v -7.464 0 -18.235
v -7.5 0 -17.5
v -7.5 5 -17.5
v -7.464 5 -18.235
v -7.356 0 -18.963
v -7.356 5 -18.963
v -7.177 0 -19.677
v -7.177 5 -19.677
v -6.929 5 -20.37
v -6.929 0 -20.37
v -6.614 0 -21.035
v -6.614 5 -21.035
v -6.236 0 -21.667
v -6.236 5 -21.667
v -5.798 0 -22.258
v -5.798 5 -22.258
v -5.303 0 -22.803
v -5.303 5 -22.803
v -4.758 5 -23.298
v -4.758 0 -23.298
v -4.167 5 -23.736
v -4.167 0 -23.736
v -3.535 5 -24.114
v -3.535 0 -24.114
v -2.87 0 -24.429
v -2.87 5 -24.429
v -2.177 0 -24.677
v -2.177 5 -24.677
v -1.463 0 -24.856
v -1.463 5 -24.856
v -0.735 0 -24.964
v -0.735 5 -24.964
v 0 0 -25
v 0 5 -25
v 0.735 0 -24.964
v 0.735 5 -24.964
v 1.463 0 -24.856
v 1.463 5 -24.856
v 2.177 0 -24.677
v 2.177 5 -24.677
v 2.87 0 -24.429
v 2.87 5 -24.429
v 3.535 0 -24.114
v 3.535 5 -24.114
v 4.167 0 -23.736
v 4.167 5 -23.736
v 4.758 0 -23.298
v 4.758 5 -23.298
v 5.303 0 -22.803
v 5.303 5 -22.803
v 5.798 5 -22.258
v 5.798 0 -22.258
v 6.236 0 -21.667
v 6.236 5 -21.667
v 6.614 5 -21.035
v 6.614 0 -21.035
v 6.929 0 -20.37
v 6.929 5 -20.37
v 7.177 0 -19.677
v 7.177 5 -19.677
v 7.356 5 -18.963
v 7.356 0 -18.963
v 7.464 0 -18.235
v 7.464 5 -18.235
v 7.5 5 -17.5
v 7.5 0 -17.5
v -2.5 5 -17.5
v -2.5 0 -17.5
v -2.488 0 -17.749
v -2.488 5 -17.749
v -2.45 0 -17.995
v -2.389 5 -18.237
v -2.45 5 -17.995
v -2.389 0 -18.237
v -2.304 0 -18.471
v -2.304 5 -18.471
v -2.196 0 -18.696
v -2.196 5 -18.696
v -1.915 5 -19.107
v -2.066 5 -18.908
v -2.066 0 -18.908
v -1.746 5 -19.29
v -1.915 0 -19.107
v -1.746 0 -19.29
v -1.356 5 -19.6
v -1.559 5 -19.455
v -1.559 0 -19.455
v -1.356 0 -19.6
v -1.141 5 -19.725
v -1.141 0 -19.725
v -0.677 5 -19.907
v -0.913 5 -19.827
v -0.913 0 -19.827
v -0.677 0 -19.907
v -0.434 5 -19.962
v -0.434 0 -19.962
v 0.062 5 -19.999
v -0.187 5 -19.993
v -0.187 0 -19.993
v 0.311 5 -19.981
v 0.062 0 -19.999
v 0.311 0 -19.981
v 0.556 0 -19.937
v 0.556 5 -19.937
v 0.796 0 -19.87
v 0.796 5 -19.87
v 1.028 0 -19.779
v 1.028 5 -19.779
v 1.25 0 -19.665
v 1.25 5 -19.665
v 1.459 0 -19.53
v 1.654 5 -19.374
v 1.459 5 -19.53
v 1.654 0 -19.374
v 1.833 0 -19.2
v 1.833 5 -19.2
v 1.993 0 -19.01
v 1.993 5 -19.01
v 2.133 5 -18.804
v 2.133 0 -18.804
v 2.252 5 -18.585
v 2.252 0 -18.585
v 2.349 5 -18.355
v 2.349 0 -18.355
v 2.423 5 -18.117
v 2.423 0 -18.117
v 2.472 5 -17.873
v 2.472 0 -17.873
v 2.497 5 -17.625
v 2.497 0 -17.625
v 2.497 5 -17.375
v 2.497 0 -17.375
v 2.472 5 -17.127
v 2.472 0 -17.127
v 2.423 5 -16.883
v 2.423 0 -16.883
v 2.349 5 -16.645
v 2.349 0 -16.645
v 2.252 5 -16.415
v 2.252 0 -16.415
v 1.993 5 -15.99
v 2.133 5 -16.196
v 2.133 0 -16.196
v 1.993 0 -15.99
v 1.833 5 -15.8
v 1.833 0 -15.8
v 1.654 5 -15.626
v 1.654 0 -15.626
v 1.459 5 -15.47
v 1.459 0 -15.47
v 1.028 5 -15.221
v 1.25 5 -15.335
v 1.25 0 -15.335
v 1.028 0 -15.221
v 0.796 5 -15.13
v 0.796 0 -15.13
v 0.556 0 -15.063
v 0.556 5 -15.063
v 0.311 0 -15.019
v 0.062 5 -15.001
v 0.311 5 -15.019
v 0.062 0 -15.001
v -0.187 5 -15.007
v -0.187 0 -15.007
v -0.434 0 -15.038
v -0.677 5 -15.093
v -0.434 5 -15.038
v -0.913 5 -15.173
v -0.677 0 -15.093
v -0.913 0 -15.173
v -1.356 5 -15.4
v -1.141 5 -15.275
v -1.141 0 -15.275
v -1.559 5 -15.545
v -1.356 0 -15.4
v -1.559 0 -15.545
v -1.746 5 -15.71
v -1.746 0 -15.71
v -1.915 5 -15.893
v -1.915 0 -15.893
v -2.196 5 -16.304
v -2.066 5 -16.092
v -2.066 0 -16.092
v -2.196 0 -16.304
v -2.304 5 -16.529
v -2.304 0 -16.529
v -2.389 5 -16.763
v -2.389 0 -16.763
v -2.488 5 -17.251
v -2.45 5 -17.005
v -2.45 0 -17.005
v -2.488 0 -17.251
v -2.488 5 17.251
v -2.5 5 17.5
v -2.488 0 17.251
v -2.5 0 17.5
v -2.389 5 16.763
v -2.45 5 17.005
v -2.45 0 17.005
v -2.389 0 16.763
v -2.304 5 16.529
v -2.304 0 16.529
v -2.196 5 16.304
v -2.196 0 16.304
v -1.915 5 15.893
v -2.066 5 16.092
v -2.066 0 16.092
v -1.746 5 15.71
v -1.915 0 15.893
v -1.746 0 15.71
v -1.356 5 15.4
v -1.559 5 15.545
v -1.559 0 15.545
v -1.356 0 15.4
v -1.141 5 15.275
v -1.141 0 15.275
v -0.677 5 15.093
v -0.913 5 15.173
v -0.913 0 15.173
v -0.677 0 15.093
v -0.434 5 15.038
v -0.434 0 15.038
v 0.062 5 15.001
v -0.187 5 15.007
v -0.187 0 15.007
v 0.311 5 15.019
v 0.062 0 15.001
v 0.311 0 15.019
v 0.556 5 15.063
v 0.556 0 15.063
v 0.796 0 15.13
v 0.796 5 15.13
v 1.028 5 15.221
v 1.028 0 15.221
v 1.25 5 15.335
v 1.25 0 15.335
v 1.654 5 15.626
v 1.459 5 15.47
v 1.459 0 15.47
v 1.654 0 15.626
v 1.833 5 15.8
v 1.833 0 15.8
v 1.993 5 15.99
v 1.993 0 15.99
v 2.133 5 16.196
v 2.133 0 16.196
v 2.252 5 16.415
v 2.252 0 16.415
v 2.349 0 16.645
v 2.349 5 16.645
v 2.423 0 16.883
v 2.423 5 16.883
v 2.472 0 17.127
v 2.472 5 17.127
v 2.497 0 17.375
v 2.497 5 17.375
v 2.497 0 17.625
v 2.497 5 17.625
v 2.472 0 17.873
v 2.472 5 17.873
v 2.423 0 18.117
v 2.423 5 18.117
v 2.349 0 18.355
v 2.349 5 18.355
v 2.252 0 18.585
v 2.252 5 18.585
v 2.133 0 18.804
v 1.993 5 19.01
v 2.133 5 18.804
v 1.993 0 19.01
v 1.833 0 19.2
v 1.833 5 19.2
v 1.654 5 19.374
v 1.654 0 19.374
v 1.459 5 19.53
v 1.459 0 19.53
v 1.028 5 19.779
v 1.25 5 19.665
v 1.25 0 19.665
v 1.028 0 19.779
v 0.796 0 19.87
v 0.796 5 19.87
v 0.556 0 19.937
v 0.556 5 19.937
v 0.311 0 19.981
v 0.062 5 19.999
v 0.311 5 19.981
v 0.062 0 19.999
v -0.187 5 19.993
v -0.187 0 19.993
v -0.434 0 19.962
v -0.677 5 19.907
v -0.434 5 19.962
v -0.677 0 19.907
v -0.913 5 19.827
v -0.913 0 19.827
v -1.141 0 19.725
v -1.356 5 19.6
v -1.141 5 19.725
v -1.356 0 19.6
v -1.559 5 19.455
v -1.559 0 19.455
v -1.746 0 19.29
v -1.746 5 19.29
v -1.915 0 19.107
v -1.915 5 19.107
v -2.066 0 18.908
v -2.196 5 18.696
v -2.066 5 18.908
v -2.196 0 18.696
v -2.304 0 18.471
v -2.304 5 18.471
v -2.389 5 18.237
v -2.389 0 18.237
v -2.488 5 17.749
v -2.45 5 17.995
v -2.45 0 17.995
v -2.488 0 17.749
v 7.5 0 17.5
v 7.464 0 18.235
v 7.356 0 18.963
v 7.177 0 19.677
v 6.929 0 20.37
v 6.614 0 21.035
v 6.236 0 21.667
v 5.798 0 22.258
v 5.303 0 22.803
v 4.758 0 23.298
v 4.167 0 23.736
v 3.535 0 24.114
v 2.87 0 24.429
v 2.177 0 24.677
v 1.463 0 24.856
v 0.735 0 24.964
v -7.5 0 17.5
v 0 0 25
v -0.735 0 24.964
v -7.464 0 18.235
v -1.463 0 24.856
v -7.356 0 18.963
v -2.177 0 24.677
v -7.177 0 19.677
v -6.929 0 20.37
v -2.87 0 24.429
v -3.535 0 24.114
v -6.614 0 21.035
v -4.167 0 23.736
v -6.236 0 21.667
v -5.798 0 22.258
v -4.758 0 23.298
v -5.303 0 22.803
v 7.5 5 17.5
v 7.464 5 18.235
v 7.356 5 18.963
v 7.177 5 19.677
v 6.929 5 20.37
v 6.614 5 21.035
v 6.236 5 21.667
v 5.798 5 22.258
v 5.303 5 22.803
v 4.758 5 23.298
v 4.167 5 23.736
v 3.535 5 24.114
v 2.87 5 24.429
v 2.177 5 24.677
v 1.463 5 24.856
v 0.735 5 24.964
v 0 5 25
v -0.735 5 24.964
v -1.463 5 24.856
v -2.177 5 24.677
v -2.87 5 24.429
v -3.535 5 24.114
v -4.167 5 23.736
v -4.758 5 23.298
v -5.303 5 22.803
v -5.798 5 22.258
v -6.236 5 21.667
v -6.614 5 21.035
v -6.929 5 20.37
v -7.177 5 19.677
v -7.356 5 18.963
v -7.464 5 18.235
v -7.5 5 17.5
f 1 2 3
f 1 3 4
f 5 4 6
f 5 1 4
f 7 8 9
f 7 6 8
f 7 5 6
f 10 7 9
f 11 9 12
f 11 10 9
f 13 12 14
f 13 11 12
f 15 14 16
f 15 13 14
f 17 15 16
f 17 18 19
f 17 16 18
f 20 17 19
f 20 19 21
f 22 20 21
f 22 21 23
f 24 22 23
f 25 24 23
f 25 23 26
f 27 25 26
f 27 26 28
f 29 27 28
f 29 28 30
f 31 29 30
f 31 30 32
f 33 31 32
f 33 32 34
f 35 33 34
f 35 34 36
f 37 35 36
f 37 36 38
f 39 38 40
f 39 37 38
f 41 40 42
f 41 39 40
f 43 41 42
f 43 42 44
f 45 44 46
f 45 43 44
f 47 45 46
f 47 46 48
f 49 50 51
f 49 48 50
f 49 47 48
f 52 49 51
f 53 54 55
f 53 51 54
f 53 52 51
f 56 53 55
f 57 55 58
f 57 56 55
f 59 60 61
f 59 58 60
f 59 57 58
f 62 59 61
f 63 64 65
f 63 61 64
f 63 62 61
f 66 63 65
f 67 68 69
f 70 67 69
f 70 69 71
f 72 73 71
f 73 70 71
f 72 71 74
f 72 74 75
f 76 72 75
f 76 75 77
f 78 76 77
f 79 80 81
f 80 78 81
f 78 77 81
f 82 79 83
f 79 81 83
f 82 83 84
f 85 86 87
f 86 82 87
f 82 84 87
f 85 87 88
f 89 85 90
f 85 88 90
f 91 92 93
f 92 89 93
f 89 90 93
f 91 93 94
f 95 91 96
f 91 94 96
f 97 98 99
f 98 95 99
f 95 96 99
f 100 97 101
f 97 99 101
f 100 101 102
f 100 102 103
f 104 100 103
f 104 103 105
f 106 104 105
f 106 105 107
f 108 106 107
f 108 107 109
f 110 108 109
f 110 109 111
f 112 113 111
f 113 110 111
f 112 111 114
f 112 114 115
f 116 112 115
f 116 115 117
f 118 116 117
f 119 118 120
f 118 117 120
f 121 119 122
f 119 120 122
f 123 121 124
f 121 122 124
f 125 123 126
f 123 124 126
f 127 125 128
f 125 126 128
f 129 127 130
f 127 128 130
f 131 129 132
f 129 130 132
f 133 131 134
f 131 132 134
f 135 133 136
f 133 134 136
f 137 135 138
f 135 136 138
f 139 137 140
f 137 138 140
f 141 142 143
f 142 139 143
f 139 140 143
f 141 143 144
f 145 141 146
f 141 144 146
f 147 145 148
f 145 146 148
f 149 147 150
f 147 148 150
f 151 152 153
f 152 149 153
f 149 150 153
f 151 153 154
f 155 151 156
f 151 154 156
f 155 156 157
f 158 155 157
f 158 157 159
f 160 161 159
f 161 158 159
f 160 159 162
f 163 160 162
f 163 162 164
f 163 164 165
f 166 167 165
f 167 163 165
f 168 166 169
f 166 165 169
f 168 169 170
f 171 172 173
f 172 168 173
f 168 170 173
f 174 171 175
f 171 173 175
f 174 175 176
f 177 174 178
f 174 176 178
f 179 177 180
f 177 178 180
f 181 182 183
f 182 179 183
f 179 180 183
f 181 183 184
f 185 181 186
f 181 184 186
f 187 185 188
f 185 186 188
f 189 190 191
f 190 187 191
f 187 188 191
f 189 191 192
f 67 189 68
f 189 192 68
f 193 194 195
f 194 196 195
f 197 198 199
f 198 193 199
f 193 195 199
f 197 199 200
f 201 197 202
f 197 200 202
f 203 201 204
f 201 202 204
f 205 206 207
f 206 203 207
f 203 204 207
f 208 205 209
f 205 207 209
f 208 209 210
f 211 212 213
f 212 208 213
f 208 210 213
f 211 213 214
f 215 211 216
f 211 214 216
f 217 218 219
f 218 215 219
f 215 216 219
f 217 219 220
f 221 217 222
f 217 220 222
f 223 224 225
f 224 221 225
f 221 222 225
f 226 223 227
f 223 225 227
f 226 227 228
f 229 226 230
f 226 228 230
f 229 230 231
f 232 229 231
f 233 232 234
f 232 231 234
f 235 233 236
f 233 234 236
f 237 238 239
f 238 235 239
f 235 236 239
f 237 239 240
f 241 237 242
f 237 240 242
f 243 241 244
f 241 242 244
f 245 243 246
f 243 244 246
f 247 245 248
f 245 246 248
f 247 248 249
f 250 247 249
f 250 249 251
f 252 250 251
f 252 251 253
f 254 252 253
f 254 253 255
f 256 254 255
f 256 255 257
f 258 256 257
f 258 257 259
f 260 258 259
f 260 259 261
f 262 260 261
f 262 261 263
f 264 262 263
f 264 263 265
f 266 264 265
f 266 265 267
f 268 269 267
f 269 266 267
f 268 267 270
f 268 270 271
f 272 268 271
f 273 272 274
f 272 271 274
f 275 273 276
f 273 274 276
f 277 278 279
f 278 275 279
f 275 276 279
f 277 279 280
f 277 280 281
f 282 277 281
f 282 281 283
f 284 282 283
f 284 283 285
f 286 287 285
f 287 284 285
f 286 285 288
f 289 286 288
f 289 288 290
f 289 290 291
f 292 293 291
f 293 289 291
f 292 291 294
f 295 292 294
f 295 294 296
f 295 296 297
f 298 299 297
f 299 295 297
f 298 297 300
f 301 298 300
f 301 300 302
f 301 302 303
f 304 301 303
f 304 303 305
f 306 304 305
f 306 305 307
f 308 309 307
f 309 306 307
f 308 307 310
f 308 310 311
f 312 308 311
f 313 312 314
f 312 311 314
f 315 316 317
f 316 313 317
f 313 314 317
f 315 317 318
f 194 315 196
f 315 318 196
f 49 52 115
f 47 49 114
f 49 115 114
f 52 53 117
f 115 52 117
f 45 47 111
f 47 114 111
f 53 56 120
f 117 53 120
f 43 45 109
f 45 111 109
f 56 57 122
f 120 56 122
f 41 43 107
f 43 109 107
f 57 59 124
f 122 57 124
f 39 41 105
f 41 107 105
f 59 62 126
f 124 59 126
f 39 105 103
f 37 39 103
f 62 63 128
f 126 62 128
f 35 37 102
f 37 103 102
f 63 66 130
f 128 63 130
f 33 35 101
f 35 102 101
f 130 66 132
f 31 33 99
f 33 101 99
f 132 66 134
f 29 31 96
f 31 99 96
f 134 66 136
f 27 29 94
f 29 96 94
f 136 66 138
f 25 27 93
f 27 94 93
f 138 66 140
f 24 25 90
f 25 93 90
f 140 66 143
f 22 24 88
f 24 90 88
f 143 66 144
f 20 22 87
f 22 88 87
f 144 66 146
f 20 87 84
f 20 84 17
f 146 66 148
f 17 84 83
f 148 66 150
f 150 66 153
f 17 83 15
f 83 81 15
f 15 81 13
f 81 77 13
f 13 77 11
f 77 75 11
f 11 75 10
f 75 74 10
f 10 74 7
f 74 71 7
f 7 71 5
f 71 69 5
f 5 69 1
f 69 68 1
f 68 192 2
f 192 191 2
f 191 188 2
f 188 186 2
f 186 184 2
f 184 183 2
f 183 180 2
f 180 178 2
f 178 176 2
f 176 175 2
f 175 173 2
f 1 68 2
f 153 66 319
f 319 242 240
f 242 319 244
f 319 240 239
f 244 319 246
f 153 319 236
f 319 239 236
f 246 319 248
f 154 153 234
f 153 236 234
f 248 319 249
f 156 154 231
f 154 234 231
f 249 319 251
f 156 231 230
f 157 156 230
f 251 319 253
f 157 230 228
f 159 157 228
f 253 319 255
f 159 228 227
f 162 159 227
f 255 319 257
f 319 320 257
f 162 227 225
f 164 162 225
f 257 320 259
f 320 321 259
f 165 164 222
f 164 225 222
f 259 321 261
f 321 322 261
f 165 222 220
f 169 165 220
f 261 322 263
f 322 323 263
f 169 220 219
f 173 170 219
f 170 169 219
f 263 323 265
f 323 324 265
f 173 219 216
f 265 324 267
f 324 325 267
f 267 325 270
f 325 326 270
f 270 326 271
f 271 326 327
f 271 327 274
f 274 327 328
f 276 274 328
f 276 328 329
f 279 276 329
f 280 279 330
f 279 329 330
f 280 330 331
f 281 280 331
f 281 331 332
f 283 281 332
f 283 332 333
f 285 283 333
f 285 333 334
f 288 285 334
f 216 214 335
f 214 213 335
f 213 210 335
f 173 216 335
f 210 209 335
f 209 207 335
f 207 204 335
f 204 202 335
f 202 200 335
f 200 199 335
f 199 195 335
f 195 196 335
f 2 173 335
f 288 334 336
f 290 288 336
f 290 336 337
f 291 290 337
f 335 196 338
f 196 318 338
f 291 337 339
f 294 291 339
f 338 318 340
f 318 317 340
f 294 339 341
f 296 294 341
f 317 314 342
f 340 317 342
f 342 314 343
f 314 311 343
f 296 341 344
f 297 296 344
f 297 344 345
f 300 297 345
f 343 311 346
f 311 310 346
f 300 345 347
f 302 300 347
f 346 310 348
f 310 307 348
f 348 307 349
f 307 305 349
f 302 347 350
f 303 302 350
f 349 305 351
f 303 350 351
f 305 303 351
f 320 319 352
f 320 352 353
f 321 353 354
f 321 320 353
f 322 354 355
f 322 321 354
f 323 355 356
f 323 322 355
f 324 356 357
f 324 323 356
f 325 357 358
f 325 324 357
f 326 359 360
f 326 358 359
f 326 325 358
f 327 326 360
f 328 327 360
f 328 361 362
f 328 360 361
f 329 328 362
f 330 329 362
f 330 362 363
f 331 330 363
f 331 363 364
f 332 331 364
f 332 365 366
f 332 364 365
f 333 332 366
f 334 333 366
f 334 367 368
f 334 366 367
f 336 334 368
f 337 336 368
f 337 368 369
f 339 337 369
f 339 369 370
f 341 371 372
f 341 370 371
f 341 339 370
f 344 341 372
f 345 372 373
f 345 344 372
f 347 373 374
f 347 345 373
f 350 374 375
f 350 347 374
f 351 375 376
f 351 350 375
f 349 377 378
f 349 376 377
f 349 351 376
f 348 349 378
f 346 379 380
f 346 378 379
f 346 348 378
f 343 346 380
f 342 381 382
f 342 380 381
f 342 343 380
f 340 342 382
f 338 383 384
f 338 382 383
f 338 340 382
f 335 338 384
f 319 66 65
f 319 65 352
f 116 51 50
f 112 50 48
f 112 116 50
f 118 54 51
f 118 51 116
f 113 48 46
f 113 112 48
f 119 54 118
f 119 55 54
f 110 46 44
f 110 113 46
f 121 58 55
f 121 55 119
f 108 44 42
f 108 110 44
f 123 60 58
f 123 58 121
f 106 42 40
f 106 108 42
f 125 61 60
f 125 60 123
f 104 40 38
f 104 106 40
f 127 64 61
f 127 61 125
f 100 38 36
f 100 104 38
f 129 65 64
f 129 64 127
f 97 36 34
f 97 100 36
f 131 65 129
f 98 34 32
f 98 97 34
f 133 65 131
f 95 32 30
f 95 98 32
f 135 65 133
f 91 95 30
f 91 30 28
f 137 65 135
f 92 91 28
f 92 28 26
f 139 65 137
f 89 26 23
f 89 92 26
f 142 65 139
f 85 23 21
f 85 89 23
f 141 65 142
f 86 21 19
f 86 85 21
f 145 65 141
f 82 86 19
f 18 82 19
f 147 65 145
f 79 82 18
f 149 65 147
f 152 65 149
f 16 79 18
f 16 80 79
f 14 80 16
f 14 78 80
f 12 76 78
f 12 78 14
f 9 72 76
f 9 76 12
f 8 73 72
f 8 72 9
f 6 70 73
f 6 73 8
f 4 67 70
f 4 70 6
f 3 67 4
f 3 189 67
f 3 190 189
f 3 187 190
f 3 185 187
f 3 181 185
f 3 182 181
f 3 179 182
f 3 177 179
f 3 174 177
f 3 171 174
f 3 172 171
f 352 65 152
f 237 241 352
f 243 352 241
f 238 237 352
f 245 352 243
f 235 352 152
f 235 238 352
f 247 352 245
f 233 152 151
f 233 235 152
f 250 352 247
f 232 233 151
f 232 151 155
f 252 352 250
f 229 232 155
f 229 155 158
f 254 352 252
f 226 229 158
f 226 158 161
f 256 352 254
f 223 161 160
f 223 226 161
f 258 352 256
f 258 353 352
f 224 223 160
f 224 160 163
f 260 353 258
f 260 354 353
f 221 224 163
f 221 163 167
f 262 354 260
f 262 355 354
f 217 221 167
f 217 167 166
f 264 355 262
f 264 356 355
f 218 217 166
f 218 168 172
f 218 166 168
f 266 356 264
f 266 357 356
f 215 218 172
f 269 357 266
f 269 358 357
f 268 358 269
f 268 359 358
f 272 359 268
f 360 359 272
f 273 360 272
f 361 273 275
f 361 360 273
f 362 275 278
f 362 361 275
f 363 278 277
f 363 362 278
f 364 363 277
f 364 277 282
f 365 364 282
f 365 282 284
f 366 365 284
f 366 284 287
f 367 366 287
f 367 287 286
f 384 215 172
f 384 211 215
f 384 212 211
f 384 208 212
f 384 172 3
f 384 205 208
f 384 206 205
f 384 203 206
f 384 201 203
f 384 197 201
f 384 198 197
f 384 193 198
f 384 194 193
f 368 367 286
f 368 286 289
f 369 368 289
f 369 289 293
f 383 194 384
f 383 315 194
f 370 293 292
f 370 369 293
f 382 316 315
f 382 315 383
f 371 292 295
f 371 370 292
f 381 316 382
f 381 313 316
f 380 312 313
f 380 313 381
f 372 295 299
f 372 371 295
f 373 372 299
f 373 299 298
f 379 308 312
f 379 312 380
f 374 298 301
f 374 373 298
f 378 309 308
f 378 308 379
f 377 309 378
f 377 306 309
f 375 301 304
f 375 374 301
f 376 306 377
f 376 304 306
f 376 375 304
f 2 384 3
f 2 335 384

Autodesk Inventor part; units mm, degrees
ref_plane "YZ Plane" through (0, 0, 0) normal (1, 0, 0) x (0, 1, 0)
ref_plane "XZ Plane" through (0, 0, 0) normal (0, 1, 0) x (-1, 0, 0)
ref_plane "XY Plane" through (0, 0, 0) normal (0, 0, 1) x (1, 0, 0)
sketch "Sketch1" plane through (0, 0, 0) normal (0, 1, 0) x (-1, 0, 0)
  line L0 (-7.5, 17.5) -> (7.5, 17.5) construction
  line L1 (7.5, 17.5) -> (7.5, -17.5)
  line L2 (7.5, -17.5) -> (-7.5, -17.5) construction
  line L3 (-7.5, -17.5) -> (-7.5, 17.5)
  line L4 (-7.5, 17.5) -> (7.5, -17.5) construction
  line L5 (7.5, 17.5) -> (-7.5, -17.5) construction
  circle A0 centre (0, 17.5) radius 2.5
  circle A1 centre (0, 17.5) radius 7.5
  circle A2 centre (0, -17.5) radius 2.5
  circle A3 centre (0, -17.5) radius 7.5
  point P0 (0, 0)
  point P1 (-7.5, 17.5)
  point P2 (-7.5, -17.5)
  dimension "d4" = 15
  dimension "d0" = 35
  dimension "d1" = 15
  dimension "d5" = 5
  dimension "d6" = 5
extrude "Extrusion1" add sketch "Sketch1" along normal blind 5
equation "\"d4\" = d1"
equation "\"d6\" = d5"
properties part number "scissor-link"
